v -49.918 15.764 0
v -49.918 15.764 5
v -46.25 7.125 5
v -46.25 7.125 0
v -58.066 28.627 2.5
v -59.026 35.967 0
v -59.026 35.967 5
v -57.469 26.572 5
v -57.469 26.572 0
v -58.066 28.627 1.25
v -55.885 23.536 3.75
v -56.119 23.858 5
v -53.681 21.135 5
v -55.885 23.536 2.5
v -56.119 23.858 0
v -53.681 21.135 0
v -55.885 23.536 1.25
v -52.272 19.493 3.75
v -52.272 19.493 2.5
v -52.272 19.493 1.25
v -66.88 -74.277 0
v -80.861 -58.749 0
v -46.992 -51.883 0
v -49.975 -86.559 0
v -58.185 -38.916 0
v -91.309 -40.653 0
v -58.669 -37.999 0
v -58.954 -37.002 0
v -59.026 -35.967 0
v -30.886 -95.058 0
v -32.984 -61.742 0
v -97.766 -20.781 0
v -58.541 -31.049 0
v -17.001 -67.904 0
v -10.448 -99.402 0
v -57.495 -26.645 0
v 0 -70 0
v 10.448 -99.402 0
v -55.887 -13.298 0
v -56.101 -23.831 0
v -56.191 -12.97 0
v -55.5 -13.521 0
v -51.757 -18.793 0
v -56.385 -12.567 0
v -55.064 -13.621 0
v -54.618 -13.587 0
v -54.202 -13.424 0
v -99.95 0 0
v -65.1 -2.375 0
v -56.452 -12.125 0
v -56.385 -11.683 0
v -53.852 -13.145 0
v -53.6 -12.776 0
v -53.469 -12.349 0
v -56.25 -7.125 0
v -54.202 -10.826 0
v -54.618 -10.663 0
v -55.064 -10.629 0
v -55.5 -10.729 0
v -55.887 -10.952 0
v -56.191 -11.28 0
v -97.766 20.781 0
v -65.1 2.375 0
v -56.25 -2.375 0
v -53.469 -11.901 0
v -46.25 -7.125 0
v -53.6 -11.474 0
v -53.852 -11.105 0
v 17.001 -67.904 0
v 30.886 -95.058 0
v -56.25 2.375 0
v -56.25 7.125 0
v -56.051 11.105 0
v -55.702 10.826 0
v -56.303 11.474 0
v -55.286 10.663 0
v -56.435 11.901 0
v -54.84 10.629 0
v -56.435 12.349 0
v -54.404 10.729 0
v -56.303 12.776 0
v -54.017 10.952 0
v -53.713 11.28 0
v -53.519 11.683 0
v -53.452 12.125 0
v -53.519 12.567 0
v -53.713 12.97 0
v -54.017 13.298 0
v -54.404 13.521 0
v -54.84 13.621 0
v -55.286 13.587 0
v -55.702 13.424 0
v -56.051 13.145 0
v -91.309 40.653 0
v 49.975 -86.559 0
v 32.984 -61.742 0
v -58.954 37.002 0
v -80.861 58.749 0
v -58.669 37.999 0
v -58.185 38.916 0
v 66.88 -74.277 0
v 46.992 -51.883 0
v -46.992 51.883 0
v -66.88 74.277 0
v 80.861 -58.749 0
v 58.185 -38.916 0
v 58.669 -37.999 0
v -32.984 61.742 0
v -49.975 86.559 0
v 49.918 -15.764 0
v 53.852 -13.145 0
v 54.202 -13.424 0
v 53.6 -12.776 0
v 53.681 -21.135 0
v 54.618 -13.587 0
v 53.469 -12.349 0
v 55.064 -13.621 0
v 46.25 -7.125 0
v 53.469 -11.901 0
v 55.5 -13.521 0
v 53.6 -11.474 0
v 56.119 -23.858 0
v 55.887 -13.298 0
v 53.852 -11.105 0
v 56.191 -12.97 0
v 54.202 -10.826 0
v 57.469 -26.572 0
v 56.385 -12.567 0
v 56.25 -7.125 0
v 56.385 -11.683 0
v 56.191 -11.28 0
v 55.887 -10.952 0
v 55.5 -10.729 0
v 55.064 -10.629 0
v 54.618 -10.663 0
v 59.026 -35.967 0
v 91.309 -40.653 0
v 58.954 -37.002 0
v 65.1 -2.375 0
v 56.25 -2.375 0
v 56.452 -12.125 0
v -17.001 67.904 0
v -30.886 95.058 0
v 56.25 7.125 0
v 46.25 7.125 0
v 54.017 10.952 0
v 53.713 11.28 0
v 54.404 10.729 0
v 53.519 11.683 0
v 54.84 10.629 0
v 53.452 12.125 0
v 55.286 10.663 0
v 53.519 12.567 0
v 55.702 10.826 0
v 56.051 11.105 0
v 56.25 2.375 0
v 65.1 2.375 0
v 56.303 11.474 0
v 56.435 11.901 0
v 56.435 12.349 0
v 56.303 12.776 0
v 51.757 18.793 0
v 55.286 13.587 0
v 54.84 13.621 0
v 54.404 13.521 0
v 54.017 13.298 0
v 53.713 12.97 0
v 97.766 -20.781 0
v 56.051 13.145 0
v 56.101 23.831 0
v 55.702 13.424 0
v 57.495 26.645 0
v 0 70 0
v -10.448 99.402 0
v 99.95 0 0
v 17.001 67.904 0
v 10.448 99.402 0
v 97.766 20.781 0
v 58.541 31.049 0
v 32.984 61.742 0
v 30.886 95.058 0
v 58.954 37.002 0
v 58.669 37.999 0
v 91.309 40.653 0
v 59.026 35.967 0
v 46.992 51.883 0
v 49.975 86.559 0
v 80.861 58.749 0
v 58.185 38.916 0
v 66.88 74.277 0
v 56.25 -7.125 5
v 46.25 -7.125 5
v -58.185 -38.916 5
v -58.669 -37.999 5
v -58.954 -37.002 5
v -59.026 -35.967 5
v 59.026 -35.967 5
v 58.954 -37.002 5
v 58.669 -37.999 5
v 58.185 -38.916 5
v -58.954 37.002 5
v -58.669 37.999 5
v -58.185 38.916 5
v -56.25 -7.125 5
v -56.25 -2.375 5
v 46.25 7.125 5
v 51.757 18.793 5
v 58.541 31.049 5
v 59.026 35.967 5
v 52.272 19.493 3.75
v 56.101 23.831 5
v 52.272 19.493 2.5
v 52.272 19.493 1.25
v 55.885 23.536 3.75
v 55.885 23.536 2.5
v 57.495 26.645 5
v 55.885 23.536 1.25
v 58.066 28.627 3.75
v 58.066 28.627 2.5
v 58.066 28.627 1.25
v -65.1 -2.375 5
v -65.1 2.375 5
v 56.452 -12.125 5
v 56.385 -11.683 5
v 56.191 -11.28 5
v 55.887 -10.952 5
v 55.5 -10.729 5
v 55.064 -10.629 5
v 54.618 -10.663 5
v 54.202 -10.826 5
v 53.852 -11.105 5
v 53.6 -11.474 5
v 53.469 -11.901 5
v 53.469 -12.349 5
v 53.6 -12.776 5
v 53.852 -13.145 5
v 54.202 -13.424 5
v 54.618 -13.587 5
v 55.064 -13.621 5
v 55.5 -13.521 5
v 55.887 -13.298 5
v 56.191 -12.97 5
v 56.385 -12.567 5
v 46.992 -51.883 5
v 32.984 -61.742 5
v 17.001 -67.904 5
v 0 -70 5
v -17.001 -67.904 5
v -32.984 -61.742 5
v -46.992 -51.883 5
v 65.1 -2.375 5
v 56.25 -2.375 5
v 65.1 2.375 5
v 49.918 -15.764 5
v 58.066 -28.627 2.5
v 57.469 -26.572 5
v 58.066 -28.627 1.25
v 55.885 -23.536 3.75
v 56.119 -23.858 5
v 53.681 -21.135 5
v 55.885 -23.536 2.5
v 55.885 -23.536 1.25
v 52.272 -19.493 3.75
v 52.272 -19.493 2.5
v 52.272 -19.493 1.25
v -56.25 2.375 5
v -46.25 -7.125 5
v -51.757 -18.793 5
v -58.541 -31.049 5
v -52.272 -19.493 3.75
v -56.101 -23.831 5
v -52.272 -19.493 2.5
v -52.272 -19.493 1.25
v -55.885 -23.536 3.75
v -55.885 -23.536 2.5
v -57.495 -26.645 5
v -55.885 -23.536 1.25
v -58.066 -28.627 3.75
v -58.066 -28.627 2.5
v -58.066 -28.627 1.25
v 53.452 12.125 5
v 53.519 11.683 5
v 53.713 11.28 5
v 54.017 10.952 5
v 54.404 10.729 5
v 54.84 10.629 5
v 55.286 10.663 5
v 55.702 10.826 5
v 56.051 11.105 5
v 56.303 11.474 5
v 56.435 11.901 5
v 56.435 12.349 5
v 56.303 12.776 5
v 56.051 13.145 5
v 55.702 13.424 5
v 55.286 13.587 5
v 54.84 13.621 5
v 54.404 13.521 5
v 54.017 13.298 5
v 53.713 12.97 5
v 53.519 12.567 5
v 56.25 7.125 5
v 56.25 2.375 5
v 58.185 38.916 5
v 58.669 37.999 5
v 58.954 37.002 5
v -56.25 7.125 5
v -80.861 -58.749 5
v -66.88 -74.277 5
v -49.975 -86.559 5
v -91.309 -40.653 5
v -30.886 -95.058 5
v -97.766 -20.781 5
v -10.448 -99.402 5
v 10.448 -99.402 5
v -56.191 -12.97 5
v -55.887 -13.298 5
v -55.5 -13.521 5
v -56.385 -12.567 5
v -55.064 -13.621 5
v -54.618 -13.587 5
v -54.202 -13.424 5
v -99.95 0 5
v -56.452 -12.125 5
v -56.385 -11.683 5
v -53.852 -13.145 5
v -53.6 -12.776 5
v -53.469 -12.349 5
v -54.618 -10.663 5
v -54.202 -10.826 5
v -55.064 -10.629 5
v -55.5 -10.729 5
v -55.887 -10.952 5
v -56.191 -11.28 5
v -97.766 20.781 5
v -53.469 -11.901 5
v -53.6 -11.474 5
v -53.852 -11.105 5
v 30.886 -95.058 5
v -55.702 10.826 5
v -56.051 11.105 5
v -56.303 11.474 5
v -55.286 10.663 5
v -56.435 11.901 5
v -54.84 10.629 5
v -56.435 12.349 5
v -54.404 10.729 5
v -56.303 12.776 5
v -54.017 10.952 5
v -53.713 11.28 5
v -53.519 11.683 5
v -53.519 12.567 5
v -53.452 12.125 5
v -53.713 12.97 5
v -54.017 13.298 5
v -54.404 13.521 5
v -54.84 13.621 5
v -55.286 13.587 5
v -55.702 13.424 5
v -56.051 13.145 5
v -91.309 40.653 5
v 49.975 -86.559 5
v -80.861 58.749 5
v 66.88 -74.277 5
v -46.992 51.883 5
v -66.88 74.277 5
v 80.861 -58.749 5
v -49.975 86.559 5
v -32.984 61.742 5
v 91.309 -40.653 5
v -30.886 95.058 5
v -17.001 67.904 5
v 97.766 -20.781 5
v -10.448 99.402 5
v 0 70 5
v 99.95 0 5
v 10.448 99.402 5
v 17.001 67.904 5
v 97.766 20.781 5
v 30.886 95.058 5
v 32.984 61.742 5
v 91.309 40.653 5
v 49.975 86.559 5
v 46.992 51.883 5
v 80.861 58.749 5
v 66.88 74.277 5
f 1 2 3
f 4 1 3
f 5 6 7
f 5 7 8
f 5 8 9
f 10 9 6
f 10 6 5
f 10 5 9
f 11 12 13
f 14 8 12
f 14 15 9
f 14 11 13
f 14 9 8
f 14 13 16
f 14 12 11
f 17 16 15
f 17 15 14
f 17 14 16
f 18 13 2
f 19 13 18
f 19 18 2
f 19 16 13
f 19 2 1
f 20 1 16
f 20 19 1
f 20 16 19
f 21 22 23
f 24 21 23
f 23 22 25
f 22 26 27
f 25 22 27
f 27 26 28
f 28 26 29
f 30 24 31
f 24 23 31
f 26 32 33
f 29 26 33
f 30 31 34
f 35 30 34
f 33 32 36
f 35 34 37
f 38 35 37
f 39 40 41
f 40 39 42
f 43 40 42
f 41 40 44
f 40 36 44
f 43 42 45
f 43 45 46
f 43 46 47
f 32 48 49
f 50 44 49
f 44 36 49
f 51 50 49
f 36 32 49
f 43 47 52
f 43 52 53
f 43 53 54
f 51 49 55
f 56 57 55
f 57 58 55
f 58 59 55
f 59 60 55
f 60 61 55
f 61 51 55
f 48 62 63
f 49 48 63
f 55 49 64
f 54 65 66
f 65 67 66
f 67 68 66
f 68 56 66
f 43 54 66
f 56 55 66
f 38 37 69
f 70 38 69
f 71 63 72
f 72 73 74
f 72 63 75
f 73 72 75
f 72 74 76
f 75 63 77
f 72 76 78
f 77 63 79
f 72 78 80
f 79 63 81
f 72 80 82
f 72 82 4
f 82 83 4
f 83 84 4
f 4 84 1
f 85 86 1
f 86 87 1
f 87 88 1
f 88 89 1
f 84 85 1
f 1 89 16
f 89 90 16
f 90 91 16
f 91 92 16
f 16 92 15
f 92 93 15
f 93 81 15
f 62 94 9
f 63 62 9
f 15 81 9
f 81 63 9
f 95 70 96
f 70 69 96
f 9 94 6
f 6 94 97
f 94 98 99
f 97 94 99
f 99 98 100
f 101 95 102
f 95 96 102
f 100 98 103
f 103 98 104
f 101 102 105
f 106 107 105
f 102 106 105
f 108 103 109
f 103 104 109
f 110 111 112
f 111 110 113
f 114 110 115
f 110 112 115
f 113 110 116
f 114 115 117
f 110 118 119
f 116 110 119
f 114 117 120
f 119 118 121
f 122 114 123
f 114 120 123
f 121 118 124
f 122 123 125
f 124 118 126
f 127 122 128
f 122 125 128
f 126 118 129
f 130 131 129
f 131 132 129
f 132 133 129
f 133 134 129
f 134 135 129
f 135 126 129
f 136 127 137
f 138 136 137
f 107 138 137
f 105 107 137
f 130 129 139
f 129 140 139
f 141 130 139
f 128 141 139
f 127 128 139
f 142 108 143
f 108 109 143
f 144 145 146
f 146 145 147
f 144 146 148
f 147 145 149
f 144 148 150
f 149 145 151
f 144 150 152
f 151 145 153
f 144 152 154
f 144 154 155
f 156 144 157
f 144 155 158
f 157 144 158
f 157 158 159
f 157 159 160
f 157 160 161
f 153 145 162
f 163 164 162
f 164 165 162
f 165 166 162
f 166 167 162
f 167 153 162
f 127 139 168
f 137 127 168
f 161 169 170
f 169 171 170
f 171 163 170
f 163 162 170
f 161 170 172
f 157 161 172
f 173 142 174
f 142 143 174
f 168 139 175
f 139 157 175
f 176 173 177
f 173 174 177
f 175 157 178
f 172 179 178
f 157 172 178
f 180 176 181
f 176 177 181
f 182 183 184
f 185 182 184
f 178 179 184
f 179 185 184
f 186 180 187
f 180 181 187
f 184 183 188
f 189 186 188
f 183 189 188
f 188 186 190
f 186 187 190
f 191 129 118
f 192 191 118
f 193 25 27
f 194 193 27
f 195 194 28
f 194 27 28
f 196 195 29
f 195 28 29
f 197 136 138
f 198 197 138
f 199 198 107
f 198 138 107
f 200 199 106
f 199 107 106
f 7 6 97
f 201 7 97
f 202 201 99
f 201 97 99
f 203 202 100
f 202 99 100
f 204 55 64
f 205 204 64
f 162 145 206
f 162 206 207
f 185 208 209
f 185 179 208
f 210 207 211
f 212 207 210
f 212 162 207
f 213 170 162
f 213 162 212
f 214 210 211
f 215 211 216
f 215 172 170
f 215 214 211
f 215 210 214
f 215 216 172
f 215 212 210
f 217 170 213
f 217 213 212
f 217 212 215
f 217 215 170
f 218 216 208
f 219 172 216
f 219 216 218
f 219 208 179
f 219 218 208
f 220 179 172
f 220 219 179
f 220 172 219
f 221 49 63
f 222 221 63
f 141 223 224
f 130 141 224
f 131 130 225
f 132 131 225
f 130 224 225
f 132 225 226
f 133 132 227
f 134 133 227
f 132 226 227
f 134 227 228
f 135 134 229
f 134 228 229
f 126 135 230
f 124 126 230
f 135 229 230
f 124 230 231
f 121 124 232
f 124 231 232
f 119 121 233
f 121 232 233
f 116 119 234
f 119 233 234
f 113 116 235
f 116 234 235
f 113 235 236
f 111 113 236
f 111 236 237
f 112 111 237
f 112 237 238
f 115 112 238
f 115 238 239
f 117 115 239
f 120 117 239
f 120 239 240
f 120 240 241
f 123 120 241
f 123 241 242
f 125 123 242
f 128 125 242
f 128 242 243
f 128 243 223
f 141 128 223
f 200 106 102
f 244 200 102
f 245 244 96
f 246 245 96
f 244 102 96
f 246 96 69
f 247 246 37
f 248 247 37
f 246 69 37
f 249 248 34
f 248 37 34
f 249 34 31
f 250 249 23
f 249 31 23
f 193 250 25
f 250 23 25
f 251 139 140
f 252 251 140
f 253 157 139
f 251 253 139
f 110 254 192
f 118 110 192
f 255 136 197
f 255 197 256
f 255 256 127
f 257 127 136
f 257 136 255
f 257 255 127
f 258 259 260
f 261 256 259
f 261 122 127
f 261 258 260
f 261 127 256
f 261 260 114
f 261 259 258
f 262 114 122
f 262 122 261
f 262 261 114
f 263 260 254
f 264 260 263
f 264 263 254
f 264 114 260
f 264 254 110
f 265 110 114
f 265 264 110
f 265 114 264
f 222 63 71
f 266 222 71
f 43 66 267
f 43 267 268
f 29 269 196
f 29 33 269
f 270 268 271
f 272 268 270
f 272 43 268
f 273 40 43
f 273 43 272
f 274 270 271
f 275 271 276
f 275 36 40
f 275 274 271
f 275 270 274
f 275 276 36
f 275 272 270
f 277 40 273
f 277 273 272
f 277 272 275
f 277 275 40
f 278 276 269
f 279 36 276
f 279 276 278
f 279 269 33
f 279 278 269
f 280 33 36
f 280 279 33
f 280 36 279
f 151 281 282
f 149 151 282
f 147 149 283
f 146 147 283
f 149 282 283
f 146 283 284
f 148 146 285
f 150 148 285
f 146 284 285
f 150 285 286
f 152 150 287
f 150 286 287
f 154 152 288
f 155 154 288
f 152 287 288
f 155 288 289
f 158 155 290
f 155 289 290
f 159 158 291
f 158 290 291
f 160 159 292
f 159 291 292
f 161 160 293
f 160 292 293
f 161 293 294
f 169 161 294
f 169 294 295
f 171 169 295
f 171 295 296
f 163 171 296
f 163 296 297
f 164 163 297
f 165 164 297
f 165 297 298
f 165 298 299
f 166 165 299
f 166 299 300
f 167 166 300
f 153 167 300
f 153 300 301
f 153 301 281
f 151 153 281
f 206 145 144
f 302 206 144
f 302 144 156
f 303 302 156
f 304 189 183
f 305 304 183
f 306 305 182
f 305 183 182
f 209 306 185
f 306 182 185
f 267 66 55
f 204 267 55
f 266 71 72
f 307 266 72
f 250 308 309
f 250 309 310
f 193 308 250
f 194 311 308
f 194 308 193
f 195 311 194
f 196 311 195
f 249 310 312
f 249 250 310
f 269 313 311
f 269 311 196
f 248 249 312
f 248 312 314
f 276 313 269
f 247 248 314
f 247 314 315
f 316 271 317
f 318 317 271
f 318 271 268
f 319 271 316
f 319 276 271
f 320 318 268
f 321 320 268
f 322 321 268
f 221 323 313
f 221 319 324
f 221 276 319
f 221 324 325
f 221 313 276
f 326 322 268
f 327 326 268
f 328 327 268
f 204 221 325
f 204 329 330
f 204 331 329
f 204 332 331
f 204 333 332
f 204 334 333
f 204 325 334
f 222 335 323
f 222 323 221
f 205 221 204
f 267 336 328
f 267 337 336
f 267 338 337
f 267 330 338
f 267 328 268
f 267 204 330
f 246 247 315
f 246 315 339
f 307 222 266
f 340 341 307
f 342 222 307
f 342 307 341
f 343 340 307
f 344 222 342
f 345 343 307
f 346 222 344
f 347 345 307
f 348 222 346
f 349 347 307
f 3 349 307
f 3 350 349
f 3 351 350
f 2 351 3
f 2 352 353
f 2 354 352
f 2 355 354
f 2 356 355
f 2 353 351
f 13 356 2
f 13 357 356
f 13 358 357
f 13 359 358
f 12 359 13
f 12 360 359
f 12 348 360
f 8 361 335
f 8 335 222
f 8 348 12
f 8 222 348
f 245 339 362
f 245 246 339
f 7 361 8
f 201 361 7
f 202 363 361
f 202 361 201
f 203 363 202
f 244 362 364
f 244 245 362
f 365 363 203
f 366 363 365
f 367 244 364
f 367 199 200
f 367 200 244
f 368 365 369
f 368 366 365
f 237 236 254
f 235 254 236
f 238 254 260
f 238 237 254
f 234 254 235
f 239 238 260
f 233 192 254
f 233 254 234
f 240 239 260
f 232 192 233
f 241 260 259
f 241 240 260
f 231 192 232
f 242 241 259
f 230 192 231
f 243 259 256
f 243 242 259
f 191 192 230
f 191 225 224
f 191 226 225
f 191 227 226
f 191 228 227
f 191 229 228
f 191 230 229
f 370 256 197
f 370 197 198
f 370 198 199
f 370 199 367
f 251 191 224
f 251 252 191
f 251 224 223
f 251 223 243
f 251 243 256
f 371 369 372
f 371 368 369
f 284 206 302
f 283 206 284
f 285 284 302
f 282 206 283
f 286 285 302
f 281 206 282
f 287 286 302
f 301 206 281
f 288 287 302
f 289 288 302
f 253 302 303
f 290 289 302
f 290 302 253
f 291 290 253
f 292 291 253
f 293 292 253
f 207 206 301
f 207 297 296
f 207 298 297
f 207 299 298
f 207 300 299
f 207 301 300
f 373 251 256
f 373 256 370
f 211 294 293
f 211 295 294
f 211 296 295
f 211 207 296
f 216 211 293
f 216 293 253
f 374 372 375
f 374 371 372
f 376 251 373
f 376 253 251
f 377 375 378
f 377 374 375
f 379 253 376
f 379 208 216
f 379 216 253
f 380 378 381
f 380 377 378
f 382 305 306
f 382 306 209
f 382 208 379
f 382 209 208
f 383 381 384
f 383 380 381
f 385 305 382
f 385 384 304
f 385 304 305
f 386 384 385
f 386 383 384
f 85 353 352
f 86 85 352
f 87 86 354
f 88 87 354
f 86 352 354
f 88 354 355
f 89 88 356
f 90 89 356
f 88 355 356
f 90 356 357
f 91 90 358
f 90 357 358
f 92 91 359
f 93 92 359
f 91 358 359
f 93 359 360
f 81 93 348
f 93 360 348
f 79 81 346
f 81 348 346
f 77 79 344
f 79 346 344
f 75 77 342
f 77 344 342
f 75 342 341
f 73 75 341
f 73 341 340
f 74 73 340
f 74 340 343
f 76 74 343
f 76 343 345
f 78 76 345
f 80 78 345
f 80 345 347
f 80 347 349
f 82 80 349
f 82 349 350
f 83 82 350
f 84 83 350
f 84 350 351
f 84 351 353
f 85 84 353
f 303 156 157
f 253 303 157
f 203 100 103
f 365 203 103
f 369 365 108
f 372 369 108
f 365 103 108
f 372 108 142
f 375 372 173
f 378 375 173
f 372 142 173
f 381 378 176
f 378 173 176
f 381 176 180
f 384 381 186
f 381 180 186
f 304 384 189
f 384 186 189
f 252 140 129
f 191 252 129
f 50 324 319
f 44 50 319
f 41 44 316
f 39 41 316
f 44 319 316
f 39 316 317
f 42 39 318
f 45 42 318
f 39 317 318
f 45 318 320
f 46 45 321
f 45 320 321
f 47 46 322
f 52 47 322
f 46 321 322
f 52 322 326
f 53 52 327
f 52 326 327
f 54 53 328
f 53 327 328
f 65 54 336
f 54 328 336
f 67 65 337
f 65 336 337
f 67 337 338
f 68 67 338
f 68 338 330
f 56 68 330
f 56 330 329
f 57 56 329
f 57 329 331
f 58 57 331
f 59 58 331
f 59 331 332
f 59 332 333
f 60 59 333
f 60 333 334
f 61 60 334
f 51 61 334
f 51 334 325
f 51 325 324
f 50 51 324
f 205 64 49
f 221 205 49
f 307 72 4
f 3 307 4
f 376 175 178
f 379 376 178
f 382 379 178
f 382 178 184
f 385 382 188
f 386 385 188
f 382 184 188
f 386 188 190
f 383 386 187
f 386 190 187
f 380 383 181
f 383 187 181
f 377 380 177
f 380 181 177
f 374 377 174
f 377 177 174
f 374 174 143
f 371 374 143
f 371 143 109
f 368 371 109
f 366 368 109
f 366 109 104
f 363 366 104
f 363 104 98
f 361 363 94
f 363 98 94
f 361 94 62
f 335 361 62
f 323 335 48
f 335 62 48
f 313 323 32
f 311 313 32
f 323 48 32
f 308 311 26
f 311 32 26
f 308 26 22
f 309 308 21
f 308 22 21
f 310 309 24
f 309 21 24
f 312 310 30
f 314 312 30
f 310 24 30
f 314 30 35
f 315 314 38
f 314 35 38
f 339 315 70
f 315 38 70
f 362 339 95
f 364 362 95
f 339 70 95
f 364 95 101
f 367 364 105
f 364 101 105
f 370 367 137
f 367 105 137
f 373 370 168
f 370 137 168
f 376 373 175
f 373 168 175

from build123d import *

# Parameters (mm, degrees)
BOSS_EXTRUDE1_OUTLINE_R = 99.95
BOSS_EXTRUDE1_DEPTH     = 5
SKETCH12_R              = 1.5
CUT_EXTRUDE1_DEPTH      = 142.439050622


# Read off the part's stored shape, not the designer's step: Boss-Extrude1
with BuildPart() as part:
    # Boss-Extrude1 outline → Boss-Extrude1 (new body)
    with BuildSketch(Plane.XY):
        Circle(BOSS_EXTRUDE1_OUTLINE_R)
        with BuildLine():
            Line((-65.1, 2.375), (-56.25, 2.375))
            Line((-56.25, 2.375), (-56.25, 7.125))
            Line((-56.25, 7.125), (-46.25, 7.125))
            add(Edge.make_bspline(
                [(-59.02632848, 35.967099571), (-58.7951175, 29.14610967), (-56.28933902, 16.934975154), (-53.993681028, 28.823744698), (-46.25, 7.125)],
                knots=[0, 0, 0, 0, 0, 1, 1, 1, 1, 1], degree=4))
            ThreePointArc((-59.02632848, 35.967099571), (-58.837492639, 37.507730313), (-58.185290714, 38.916216986))
            ThreePointArc((-58.185290714, 38.916216986), (0, 70), (58.185290714, 38.916216986))
            ThreePointArc((58.185290714, 38.916216986), (58.837492639, 37.507730313), (59.02632848, 35.967099571))
            add(Edge.make_bspline(
                [(46.25, 7.125), (53.993681028, 28.823744698), (56.28933902, 16.934975154), (58.7951175, 29.14610967), (59.02632848, 35.967099571)],
                knots=[0, 0, 0, 0, 0, 1, 1, 1, 1, 1], degree=4))
            Line((46.25, 7.125), (56.25, 7.125))
            Line((56.25, 7.125), (56.25, 2.375))
            Line((56.25, 2.375), (65.1, 2.375))
            Line((65.1, 2.375), (65.1, -2.375))
            Line((65.1, -2.375), (56.25, -2.375))
            Line((56.25, -2.375), (56.25, -7.125))
            Line((56.25, -7.125), (46.25, -7.125))
            add(Edge.make_bspline(
                [(59.02632848, -35.967099571), (58.7951175, -29.14610967), (56.28933902, -16.934975154), (53.993681028, -28.823744698), (46.25, -7.125)],
                knots=[0, 0, 0, 0, 0, 1, 1, 1, 1, 1], degree=4))
            ThreePointArc((59.02632848, -35.967099571), (58.837492639, -37.507730313), (58.185290714, -38.916216986))
            ThreePointArc((58.185290714, -38.916216986), (0, -70), (-58.185290714, -38.916216986))
            ThreePointArc((-58.185290714, -38.916216986), (-58.837492639, -37.507730313), (-59.02632848, -35.967099571))
            add(Edge.make_bspline(
                [(-46.25, -7.125), (-53.993681028, -28.823744698), (-56.28933902, -16.934975154), (-58.7951175, -29.14610967), (-59.02632848, -35.967099571)],
                knots=[0, 0, 0, 0, 0, 1, 1, 1, 1, 1], degree=4))
            Line((-46.25, -7.125), (-56.25, -7.125))
            Line((-56.25, -7.125), (-56.25, -2.375))
            Line((-56.25, -2.375), (-65.1, -2.375))
            Line((-65.1, -2.375), (-65.1, 2.375))
        make_face(mode=Mode.SUBTRACT)
    extrude(amount=BOSS_EXTRUDE1_DEPTH)

    # Sketch12 → Cut-Extrude1 (cut, through all)
    with BuildSketch(Plane.XY.offset(5)):
        with Locations((-54.951905284, 12.125)):
            Circle(SKETCH12_R)
        with Locations(Location((54.951905284, 12.125, 0), (0, 0, 180))):
            Circle(SKETCH12_R)
        with Locations((54.951905284, -12.125)):
            Circle(SKETCH12_R)
        with Locations(Location((-54.951905284, -12.125, 0), (0, 0, 180))):
            Circle(SKETCH12_R)
    extrude(amount=-CUT_EXTRUDE1_DEPTH, mode=Mode.SUBTRACT)


solid = part.part
